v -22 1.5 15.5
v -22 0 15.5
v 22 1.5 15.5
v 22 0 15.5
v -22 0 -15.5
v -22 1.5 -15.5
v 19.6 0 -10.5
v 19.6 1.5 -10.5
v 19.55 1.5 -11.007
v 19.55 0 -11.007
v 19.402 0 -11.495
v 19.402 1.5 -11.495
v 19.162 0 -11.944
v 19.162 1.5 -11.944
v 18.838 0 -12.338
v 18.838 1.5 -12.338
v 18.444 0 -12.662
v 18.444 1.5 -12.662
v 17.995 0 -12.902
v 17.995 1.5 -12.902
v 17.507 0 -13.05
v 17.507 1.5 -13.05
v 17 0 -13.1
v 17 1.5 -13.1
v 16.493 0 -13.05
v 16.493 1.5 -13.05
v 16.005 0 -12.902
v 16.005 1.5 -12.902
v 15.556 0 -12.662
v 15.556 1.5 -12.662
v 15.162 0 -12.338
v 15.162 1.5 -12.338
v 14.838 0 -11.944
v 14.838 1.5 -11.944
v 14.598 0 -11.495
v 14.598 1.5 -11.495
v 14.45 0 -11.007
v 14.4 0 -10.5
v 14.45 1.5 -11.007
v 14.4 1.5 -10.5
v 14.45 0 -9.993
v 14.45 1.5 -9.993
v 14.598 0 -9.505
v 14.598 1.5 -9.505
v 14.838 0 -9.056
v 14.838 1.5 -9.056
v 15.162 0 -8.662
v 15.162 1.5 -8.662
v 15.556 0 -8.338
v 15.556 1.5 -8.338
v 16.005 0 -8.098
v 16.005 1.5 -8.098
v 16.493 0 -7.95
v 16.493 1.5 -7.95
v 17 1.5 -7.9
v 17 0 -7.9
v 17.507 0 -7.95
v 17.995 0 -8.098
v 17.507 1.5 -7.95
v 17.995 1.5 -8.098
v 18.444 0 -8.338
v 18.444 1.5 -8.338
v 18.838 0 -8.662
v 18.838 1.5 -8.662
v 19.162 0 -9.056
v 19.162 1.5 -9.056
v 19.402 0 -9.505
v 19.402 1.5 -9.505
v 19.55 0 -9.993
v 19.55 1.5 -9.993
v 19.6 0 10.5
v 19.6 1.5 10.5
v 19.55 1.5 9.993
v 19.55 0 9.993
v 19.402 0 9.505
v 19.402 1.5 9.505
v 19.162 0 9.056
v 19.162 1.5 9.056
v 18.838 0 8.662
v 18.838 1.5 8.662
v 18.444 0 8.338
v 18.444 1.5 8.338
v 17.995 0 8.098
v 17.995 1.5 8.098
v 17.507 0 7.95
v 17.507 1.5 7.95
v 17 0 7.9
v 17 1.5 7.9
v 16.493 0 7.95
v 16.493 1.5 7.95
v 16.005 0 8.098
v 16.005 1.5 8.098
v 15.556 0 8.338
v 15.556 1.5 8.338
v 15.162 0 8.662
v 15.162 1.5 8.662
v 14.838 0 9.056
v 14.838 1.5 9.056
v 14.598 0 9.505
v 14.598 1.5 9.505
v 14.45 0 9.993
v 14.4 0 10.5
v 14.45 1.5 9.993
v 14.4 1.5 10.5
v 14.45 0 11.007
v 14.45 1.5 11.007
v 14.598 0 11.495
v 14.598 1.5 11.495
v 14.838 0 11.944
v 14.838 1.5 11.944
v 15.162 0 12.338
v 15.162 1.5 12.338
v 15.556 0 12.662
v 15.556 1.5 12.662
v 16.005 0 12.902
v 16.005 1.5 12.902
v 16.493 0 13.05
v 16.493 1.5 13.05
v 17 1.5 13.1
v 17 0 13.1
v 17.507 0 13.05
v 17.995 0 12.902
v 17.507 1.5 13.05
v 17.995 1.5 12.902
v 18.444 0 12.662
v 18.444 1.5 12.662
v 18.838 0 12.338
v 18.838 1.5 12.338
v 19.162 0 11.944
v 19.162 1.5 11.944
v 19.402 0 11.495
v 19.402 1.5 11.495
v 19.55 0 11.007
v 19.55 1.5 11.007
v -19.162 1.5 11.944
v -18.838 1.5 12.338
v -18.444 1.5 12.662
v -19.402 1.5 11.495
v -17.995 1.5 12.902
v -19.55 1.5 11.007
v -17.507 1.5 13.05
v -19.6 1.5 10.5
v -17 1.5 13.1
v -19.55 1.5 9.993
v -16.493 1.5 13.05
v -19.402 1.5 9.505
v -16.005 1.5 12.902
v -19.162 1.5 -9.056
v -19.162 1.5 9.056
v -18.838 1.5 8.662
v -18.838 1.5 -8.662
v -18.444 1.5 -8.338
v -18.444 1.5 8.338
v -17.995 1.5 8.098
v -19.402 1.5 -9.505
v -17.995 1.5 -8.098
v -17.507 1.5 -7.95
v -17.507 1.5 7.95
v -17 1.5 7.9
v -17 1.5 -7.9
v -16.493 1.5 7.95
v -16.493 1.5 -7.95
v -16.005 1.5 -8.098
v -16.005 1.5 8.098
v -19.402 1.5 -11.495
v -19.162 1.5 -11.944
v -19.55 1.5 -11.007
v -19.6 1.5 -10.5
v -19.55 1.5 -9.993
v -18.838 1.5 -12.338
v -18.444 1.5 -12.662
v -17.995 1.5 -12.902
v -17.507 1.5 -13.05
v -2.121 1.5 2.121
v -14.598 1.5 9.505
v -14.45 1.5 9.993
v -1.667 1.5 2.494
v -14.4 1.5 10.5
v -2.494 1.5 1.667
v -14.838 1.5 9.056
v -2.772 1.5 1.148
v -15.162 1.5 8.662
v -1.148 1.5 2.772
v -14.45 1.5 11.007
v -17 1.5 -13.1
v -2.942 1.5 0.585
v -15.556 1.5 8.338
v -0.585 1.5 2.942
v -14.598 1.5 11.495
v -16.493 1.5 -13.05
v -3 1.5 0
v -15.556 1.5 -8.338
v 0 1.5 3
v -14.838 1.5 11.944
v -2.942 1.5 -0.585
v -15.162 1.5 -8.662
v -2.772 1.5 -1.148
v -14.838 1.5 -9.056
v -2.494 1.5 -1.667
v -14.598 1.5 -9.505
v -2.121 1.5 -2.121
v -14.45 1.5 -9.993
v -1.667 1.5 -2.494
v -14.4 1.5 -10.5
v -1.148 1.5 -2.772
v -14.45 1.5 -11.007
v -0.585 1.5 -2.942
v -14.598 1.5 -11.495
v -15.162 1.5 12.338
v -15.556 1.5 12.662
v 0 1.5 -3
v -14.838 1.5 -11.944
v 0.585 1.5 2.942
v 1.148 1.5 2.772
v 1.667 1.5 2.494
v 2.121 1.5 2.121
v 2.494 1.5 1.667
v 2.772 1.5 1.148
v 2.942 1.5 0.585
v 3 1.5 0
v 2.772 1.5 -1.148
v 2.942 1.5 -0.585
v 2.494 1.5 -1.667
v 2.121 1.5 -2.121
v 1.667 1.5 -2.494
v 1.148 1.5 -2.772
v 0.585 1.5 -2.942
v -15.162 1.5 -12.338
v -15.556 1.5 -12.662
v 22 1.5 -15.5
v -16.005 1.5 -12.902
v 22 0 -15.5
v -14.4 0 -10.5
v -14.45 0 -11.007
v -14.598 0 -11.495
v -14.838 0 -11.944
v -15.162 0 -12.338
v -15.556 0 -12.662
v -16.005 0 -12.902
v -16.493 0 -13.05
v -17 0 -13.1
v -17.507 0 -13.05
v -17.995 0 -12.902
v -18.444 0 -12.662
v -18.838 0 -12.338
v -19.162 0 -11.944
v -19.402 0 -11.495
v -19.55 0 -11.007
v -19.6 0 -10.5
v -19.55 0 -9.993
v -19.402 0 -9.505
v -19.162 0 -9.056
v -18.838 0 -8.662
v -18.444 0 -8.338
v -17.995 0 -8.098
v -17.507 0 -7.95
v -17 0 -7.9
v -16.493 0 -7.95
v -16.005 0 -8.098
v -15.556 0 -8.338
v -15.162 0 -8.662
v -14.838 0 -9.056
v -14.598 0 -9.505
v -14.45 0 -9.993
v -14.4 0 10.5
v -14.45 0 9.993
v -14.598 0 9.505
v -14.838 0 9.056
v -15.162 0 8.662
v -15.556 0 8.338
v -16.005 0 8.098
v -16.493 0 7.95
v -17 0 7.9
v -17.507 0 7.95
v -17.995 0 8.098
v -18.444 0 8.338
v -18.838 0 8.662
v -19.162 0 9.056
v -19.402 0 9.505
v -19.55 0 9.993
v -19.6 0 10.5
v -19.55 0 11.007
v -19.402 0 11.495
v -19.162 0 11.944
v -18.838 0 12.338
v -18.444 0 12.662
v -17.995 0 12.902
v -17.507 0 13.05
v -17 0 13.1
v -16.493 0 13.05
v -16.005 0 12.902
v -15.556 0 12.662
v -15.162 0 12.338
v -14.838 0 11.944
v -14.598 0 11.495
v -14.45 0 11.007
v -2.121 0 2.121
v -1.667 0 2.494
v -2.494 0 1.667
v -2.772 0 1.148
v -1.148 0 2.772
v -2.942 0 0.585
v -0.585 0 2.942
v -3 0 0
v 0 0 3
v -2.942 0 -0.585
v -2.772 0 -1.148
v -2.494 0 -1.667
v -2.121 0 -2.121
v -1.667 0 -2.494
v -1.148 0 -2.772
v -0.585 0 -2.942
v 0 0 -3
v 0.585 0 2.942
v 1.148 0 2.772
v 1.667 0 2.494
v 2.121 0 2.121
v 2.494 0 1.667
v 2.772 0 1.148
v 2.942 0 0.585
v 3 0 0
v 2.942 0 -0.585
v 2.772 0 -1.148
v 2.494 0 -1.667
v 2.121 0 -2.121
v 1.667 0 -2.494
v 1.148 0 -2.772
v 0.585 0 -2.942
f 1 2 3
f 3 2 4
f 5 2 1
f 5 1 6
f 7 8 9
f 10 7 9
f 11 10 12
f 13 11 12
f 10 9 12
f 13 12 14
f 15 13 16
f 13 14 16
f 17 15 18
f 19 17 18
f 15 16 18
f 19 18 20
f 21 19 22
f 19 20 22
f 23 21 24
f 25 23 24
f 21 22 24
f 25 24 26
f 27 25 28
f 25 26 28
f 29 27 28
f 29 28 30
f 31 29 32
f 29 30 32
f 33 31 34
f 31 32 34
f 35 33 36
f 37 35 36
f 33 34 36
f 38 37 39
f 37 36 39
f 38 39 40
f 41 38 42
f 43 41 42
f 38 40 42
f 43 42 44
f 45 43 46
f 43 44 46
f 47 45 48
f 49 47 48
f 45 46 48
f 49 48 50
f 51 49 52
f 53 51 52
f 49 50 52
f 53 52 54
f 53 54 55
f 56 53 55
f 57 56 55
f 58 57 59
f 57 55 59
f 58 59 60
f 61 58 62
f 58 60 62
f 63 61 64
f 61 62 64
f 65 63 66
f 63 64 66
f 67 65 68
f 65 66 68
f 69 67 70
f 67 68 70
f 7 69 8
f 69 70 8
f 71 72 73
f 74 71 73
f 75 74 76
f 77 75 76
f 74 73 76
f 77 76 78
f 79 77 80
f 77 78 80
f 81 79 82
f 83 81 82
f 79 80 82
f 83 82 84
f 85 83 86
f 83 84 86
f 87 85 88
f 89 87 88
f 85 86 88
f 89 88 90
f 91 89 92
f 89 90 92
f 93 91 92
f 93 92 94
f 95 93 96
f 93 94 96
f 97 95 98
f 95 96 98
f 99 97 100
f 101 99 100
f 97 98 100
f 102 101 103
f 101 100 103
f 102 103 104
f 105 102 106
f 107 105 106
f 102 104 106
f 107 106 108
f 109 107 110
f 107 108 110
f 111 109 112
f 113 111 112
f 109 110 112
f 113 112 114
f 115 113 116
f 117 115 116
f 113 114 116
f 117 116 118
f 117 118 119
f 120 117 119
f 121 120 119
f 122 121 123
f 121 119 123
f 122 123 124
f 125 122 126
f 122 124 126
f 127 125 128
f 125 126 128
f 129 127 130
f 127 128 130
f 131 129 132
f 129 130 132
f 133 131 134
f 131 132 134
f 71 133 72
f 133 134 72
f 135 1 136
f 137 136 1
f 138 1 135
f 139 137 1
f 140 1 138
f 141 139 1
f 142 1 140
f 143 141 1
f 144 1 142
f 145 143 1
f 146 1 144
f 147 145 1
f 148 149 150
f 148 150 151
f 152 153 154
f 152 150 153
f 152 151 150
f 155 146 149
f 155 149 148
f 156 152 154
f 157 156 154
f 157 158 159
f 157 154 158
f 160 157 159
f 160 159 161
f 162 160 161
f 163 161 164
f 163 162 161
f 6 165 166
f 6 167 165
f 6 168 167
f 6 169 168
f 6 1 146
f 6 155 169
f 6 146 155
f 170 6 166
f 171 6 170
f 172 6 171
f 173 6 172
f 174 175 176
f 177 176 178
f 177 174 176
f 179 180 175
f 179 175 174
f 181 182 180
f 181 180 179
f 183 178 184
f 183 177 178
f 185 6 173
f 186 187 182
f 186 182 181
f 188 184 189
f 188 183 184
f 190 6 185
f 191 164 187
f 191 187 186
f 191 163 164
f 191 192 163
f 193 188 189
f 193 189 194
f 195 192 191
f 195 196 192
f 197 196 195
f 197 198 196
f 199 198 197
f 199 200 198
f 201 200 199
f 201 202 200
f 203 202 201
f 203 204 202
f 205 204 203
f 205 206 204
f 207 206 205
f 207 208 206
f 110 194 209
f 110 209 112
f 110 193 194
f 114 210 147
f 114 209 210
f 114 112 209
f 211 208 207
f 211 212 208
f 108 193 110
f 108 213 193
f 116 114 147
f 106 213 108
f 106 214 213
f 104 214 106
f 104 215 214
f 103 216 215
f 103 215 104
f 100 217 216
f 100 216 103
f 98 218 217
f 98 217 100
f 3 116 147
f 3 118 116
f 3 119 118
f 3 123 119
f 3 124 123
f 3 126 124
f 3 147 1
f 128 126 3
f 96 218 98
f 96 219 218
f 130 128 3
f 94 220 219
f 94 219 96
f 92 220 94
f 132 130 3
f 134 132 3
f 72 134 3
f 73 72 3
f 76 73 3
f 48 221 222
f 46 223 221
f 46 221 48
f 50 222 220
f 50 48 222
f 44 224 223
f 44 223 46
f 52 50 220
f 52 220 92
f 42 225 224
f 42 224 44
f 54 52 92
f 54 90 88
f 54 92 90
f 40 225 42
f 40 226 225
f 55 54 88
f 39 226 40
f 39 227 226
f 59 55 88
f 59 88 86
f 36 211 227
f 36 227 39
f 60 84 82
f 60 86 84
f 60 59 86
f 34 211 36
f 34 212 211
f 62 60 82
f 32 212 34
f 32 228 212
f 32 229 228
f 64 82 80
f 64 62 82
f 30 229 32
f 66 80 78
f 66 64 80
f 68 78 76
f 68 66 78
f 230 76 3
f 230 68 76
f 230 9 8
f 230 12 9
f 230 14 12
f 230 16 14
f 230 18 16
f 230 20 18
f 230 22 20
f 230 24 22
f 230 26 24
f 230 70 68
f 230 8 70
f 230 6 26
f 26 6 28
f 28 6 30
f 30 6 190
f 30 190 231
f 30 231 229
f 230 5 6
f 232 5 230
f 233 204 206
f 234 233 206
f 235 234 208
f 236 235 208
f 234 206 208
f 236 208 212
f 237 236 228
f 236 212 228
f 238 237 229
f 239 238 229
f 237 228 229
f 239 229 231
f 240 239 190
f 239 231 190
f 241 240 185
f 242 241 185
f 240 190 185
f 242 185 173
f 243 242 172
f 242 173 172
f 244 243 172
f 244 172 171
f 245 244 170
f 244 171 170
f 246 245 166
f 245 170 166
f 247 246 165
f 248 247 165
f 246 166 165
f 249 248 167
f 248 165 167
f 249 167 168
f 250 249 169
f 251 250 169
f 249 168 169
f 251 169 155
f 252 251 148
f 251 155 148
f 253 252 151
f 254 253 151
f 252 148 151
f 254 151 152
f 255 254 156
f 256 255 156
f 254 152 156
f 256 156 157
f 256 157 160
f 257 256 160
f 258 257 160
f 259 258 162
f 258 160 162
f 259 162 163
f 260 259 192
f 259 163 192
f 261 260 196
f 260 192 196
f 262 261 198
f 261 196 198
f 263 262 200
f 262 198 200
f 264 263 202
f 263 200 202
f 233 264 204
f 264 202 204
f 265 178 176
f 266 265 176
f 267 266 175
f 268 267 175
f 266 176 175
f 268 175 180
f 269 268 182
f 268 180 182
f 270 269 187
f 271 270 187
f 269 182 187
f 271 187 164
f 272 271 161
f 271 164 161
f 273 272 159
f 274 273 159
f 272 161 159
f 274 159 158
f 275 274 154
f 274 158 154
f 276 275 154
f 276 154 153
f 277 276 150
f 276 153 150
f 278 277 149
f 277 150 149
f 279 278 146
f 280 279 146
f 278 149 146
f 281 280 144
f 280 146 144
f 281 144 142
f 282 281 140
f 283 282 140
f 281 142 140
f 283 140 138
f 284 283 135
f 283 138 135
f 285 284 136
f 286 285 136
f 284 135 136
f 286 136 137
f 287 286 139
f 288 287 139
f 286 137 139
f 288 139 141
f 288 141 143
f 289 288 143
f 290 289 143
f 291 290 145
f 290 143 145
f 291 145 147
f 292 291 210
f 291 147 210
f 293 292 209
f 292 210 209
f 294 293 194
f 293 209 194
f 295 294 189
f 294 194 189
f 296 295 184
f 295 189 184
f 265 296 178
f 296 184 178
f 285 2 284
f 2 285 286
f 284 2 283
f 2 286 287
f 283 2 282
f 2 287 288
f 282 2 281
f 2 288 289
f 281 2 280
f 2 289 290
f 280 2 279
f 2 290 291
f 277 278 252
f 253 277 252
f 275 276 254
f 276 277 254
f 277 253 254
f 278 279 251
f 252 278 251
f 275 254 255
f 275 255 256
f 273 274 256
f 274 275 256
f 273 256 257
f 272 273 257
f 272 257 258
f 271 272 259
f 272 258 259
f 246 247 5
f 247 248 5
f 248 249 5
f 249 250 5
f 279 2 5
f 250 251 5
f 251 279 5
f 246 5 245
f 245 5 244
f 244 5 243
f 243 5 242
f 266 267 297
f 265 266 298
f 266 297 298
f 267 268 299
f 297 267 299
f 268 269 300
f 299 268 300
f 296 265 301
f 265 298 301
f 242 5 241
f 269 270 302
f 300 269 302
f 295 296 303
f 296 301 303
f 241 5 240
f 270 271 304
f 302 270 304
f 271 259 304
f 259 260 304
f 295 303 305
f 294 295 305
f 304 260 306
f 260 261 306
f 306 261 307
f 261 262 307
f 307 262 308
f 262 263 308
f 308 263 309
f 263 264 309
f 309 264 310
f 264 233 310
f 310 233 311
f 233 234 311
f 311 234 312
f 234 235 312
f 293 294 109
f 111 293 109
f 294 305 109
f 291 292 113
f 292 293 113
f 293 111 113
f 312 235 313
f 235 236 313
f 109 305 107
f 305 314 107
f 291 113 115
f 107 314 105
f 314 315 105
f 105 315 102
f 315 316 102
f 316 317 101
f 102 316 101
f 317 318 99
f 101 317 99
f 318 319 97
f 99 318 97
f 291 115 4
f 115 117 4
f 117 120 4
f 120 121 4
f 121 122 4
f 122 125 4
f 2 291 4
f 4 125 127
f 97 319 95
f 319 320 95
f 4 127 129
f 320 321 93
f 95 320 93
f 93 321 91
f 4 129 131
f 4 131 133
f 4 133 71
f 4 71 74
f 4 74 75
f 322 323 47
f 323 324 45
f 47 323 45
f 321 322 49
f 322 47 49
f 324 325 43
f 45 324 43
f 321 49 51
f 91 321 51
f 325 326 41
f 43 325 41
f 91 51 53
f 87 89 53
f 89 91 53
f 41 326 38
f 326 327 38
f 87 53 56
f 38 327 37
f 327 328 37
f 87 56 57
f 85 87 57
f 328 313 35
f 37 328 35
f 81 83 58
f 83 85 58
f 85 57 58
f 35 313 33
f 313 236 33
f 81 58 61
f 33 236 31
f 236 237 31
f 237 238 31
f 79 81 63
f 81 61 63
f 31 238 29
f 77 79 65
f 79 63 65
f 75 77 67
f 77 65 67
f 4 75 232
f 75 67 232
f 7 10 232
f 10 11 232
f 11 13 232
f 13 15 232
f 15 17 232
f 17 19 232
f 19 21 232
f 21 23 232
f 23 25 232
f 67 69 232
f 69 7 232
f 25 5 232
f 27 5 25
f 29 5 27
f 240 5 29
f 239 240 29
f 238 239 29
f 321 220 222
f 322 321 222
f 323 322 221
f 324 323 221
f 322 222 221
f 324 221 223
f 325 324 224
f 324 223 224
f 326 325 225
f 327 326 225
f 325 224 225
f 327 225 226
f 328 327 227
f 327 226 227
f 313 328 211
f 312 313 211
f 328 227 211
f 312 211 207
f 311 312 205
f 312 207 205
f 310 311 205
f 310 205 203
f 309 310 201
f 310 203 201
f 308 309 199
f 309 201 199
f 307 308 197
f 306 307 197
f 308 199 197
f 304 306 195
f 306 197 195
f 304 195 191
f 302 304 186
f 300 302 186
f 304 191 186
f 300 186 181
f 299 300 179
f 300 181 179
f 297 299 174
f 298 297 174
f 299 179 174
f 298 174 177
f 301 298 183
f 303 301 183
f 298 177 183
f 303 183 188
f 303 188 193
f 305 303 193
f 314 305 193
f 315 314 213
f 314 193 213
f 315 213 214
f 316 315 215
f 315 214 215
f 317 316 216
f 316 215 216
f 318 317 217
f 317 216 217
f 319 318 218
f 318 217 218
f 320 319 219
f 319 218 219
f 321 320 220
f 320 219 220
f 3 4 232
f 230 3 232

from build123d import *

# Parameters (mm, degrees)
SKETCH1_W           = 44
SKETCH1_H           = 31
BOSS_EXTRUDE1_DEPTH = 1.5
SKETCH2_R           = 2.6
SKETCH2_R_2         = 3
CUT_EXTRUDE1_DEPTH  = 1.5


with BuildPart() as part:
    # Sketch1 → Boss-Extrude1 (new body)
    with BuildSketch(Plane(origin=(0, 0, 0), x_dir=(1, 0, 0), z_dir=(0, 1, 0))):
        Rectangle(SKETCH1_W, SKETCH1_H)
    extrude(amount=BOSS_EXTRUDE1_DEPTH)

    # Sketch2 → Cut-Extrude1 (cut)
    with BuildSketch(Plane(origin=(0, 1.5, 0), x_dir=(1, 0, 0), z_dir=(0, 1, 0))):
        with Locations((-17, 10.5)):
            Circle(SKETCH2_R)
        with Locations((17, 10.5)):
            Circle(SKETCH2_R)
        with Locations((17, -10.5)):
            Circle(SKETCH2_R)
        with Locations((-17, -10.5)):
            Circle(SKETCH2_R)
        Circle(SKETCH2_R_2)
    extrude(amount=-CUT_EXTRUDE1_DEPTH, mode=Mode.SUBTRACT)


solid = part.part
